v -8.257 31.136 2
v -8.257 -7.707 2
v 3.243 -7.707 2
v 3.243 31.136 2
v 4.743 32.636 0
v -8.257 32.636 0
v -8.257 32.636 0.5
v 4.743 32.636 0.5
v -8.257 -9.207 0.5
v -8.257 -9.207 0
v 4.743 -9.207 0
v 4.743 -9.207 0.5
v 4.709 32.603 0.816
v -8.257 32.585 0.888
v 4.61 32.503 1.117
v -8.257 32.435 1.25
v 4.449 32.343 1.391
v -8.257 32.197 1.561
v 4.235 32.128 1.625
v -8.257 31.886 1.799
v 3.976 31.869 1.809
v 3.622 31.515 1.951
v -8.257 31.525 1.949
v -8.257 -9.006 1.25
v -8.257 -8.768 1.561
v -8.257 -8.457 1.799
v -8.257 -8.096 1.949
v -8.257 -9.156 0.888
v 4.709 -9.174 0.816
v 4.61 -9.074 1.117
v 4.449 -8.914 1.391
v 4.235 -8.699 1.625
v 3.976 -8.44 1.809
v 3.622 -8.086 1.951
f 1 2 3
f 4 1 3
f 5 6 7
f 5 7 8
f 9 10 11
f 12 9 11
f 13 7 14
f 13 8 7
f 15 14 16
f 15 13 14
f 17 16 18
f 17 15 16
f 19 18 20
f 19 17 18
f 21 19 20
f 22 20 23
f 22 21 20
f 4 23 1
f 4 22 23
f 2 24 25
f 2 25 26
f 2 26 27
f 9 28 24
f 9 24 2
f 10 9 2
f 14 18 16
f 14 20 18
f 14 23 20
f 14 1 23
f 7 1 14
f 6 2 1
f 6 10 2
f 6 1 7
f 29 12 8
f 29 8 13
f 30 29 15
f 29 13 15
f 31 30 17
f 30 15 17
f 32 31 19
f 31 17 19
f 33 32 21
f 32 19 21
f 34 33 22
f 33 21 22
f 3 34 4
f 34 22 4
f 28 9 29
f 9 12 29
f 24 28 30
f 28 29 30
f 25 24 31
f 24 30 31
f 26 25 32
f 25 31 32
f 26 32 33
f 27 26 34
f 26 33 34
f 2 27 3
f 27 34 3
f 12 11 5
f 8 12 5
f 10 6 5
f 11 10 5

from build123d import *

# Parameters (mm, degrees)
F0_W     = 13
F0_H     = 41.843747
F1_DEPTH = 2
F2_R     = 1.5


with BuildPart() as f1:
    # F0 (on Top) → F1 (new body)
    with BuildSketch(Plane.XY):
        with Locations((-1.757174, 11.714493)):
            Rectangle(F0_W, F0_H)
    extrude(amount=F1_DEPTH)

    # F2
    f2_edges = [f1.edges().sort_by_distance(p)[0] for p in [
        (-1.757174, -9.20738, 2),
        (4.742826, 11.714494, 2),
        (-1.757174, 32.636367, 2),
    ]]
    fillet(f2_edges, radius=F2_R)


solid = f1.part
